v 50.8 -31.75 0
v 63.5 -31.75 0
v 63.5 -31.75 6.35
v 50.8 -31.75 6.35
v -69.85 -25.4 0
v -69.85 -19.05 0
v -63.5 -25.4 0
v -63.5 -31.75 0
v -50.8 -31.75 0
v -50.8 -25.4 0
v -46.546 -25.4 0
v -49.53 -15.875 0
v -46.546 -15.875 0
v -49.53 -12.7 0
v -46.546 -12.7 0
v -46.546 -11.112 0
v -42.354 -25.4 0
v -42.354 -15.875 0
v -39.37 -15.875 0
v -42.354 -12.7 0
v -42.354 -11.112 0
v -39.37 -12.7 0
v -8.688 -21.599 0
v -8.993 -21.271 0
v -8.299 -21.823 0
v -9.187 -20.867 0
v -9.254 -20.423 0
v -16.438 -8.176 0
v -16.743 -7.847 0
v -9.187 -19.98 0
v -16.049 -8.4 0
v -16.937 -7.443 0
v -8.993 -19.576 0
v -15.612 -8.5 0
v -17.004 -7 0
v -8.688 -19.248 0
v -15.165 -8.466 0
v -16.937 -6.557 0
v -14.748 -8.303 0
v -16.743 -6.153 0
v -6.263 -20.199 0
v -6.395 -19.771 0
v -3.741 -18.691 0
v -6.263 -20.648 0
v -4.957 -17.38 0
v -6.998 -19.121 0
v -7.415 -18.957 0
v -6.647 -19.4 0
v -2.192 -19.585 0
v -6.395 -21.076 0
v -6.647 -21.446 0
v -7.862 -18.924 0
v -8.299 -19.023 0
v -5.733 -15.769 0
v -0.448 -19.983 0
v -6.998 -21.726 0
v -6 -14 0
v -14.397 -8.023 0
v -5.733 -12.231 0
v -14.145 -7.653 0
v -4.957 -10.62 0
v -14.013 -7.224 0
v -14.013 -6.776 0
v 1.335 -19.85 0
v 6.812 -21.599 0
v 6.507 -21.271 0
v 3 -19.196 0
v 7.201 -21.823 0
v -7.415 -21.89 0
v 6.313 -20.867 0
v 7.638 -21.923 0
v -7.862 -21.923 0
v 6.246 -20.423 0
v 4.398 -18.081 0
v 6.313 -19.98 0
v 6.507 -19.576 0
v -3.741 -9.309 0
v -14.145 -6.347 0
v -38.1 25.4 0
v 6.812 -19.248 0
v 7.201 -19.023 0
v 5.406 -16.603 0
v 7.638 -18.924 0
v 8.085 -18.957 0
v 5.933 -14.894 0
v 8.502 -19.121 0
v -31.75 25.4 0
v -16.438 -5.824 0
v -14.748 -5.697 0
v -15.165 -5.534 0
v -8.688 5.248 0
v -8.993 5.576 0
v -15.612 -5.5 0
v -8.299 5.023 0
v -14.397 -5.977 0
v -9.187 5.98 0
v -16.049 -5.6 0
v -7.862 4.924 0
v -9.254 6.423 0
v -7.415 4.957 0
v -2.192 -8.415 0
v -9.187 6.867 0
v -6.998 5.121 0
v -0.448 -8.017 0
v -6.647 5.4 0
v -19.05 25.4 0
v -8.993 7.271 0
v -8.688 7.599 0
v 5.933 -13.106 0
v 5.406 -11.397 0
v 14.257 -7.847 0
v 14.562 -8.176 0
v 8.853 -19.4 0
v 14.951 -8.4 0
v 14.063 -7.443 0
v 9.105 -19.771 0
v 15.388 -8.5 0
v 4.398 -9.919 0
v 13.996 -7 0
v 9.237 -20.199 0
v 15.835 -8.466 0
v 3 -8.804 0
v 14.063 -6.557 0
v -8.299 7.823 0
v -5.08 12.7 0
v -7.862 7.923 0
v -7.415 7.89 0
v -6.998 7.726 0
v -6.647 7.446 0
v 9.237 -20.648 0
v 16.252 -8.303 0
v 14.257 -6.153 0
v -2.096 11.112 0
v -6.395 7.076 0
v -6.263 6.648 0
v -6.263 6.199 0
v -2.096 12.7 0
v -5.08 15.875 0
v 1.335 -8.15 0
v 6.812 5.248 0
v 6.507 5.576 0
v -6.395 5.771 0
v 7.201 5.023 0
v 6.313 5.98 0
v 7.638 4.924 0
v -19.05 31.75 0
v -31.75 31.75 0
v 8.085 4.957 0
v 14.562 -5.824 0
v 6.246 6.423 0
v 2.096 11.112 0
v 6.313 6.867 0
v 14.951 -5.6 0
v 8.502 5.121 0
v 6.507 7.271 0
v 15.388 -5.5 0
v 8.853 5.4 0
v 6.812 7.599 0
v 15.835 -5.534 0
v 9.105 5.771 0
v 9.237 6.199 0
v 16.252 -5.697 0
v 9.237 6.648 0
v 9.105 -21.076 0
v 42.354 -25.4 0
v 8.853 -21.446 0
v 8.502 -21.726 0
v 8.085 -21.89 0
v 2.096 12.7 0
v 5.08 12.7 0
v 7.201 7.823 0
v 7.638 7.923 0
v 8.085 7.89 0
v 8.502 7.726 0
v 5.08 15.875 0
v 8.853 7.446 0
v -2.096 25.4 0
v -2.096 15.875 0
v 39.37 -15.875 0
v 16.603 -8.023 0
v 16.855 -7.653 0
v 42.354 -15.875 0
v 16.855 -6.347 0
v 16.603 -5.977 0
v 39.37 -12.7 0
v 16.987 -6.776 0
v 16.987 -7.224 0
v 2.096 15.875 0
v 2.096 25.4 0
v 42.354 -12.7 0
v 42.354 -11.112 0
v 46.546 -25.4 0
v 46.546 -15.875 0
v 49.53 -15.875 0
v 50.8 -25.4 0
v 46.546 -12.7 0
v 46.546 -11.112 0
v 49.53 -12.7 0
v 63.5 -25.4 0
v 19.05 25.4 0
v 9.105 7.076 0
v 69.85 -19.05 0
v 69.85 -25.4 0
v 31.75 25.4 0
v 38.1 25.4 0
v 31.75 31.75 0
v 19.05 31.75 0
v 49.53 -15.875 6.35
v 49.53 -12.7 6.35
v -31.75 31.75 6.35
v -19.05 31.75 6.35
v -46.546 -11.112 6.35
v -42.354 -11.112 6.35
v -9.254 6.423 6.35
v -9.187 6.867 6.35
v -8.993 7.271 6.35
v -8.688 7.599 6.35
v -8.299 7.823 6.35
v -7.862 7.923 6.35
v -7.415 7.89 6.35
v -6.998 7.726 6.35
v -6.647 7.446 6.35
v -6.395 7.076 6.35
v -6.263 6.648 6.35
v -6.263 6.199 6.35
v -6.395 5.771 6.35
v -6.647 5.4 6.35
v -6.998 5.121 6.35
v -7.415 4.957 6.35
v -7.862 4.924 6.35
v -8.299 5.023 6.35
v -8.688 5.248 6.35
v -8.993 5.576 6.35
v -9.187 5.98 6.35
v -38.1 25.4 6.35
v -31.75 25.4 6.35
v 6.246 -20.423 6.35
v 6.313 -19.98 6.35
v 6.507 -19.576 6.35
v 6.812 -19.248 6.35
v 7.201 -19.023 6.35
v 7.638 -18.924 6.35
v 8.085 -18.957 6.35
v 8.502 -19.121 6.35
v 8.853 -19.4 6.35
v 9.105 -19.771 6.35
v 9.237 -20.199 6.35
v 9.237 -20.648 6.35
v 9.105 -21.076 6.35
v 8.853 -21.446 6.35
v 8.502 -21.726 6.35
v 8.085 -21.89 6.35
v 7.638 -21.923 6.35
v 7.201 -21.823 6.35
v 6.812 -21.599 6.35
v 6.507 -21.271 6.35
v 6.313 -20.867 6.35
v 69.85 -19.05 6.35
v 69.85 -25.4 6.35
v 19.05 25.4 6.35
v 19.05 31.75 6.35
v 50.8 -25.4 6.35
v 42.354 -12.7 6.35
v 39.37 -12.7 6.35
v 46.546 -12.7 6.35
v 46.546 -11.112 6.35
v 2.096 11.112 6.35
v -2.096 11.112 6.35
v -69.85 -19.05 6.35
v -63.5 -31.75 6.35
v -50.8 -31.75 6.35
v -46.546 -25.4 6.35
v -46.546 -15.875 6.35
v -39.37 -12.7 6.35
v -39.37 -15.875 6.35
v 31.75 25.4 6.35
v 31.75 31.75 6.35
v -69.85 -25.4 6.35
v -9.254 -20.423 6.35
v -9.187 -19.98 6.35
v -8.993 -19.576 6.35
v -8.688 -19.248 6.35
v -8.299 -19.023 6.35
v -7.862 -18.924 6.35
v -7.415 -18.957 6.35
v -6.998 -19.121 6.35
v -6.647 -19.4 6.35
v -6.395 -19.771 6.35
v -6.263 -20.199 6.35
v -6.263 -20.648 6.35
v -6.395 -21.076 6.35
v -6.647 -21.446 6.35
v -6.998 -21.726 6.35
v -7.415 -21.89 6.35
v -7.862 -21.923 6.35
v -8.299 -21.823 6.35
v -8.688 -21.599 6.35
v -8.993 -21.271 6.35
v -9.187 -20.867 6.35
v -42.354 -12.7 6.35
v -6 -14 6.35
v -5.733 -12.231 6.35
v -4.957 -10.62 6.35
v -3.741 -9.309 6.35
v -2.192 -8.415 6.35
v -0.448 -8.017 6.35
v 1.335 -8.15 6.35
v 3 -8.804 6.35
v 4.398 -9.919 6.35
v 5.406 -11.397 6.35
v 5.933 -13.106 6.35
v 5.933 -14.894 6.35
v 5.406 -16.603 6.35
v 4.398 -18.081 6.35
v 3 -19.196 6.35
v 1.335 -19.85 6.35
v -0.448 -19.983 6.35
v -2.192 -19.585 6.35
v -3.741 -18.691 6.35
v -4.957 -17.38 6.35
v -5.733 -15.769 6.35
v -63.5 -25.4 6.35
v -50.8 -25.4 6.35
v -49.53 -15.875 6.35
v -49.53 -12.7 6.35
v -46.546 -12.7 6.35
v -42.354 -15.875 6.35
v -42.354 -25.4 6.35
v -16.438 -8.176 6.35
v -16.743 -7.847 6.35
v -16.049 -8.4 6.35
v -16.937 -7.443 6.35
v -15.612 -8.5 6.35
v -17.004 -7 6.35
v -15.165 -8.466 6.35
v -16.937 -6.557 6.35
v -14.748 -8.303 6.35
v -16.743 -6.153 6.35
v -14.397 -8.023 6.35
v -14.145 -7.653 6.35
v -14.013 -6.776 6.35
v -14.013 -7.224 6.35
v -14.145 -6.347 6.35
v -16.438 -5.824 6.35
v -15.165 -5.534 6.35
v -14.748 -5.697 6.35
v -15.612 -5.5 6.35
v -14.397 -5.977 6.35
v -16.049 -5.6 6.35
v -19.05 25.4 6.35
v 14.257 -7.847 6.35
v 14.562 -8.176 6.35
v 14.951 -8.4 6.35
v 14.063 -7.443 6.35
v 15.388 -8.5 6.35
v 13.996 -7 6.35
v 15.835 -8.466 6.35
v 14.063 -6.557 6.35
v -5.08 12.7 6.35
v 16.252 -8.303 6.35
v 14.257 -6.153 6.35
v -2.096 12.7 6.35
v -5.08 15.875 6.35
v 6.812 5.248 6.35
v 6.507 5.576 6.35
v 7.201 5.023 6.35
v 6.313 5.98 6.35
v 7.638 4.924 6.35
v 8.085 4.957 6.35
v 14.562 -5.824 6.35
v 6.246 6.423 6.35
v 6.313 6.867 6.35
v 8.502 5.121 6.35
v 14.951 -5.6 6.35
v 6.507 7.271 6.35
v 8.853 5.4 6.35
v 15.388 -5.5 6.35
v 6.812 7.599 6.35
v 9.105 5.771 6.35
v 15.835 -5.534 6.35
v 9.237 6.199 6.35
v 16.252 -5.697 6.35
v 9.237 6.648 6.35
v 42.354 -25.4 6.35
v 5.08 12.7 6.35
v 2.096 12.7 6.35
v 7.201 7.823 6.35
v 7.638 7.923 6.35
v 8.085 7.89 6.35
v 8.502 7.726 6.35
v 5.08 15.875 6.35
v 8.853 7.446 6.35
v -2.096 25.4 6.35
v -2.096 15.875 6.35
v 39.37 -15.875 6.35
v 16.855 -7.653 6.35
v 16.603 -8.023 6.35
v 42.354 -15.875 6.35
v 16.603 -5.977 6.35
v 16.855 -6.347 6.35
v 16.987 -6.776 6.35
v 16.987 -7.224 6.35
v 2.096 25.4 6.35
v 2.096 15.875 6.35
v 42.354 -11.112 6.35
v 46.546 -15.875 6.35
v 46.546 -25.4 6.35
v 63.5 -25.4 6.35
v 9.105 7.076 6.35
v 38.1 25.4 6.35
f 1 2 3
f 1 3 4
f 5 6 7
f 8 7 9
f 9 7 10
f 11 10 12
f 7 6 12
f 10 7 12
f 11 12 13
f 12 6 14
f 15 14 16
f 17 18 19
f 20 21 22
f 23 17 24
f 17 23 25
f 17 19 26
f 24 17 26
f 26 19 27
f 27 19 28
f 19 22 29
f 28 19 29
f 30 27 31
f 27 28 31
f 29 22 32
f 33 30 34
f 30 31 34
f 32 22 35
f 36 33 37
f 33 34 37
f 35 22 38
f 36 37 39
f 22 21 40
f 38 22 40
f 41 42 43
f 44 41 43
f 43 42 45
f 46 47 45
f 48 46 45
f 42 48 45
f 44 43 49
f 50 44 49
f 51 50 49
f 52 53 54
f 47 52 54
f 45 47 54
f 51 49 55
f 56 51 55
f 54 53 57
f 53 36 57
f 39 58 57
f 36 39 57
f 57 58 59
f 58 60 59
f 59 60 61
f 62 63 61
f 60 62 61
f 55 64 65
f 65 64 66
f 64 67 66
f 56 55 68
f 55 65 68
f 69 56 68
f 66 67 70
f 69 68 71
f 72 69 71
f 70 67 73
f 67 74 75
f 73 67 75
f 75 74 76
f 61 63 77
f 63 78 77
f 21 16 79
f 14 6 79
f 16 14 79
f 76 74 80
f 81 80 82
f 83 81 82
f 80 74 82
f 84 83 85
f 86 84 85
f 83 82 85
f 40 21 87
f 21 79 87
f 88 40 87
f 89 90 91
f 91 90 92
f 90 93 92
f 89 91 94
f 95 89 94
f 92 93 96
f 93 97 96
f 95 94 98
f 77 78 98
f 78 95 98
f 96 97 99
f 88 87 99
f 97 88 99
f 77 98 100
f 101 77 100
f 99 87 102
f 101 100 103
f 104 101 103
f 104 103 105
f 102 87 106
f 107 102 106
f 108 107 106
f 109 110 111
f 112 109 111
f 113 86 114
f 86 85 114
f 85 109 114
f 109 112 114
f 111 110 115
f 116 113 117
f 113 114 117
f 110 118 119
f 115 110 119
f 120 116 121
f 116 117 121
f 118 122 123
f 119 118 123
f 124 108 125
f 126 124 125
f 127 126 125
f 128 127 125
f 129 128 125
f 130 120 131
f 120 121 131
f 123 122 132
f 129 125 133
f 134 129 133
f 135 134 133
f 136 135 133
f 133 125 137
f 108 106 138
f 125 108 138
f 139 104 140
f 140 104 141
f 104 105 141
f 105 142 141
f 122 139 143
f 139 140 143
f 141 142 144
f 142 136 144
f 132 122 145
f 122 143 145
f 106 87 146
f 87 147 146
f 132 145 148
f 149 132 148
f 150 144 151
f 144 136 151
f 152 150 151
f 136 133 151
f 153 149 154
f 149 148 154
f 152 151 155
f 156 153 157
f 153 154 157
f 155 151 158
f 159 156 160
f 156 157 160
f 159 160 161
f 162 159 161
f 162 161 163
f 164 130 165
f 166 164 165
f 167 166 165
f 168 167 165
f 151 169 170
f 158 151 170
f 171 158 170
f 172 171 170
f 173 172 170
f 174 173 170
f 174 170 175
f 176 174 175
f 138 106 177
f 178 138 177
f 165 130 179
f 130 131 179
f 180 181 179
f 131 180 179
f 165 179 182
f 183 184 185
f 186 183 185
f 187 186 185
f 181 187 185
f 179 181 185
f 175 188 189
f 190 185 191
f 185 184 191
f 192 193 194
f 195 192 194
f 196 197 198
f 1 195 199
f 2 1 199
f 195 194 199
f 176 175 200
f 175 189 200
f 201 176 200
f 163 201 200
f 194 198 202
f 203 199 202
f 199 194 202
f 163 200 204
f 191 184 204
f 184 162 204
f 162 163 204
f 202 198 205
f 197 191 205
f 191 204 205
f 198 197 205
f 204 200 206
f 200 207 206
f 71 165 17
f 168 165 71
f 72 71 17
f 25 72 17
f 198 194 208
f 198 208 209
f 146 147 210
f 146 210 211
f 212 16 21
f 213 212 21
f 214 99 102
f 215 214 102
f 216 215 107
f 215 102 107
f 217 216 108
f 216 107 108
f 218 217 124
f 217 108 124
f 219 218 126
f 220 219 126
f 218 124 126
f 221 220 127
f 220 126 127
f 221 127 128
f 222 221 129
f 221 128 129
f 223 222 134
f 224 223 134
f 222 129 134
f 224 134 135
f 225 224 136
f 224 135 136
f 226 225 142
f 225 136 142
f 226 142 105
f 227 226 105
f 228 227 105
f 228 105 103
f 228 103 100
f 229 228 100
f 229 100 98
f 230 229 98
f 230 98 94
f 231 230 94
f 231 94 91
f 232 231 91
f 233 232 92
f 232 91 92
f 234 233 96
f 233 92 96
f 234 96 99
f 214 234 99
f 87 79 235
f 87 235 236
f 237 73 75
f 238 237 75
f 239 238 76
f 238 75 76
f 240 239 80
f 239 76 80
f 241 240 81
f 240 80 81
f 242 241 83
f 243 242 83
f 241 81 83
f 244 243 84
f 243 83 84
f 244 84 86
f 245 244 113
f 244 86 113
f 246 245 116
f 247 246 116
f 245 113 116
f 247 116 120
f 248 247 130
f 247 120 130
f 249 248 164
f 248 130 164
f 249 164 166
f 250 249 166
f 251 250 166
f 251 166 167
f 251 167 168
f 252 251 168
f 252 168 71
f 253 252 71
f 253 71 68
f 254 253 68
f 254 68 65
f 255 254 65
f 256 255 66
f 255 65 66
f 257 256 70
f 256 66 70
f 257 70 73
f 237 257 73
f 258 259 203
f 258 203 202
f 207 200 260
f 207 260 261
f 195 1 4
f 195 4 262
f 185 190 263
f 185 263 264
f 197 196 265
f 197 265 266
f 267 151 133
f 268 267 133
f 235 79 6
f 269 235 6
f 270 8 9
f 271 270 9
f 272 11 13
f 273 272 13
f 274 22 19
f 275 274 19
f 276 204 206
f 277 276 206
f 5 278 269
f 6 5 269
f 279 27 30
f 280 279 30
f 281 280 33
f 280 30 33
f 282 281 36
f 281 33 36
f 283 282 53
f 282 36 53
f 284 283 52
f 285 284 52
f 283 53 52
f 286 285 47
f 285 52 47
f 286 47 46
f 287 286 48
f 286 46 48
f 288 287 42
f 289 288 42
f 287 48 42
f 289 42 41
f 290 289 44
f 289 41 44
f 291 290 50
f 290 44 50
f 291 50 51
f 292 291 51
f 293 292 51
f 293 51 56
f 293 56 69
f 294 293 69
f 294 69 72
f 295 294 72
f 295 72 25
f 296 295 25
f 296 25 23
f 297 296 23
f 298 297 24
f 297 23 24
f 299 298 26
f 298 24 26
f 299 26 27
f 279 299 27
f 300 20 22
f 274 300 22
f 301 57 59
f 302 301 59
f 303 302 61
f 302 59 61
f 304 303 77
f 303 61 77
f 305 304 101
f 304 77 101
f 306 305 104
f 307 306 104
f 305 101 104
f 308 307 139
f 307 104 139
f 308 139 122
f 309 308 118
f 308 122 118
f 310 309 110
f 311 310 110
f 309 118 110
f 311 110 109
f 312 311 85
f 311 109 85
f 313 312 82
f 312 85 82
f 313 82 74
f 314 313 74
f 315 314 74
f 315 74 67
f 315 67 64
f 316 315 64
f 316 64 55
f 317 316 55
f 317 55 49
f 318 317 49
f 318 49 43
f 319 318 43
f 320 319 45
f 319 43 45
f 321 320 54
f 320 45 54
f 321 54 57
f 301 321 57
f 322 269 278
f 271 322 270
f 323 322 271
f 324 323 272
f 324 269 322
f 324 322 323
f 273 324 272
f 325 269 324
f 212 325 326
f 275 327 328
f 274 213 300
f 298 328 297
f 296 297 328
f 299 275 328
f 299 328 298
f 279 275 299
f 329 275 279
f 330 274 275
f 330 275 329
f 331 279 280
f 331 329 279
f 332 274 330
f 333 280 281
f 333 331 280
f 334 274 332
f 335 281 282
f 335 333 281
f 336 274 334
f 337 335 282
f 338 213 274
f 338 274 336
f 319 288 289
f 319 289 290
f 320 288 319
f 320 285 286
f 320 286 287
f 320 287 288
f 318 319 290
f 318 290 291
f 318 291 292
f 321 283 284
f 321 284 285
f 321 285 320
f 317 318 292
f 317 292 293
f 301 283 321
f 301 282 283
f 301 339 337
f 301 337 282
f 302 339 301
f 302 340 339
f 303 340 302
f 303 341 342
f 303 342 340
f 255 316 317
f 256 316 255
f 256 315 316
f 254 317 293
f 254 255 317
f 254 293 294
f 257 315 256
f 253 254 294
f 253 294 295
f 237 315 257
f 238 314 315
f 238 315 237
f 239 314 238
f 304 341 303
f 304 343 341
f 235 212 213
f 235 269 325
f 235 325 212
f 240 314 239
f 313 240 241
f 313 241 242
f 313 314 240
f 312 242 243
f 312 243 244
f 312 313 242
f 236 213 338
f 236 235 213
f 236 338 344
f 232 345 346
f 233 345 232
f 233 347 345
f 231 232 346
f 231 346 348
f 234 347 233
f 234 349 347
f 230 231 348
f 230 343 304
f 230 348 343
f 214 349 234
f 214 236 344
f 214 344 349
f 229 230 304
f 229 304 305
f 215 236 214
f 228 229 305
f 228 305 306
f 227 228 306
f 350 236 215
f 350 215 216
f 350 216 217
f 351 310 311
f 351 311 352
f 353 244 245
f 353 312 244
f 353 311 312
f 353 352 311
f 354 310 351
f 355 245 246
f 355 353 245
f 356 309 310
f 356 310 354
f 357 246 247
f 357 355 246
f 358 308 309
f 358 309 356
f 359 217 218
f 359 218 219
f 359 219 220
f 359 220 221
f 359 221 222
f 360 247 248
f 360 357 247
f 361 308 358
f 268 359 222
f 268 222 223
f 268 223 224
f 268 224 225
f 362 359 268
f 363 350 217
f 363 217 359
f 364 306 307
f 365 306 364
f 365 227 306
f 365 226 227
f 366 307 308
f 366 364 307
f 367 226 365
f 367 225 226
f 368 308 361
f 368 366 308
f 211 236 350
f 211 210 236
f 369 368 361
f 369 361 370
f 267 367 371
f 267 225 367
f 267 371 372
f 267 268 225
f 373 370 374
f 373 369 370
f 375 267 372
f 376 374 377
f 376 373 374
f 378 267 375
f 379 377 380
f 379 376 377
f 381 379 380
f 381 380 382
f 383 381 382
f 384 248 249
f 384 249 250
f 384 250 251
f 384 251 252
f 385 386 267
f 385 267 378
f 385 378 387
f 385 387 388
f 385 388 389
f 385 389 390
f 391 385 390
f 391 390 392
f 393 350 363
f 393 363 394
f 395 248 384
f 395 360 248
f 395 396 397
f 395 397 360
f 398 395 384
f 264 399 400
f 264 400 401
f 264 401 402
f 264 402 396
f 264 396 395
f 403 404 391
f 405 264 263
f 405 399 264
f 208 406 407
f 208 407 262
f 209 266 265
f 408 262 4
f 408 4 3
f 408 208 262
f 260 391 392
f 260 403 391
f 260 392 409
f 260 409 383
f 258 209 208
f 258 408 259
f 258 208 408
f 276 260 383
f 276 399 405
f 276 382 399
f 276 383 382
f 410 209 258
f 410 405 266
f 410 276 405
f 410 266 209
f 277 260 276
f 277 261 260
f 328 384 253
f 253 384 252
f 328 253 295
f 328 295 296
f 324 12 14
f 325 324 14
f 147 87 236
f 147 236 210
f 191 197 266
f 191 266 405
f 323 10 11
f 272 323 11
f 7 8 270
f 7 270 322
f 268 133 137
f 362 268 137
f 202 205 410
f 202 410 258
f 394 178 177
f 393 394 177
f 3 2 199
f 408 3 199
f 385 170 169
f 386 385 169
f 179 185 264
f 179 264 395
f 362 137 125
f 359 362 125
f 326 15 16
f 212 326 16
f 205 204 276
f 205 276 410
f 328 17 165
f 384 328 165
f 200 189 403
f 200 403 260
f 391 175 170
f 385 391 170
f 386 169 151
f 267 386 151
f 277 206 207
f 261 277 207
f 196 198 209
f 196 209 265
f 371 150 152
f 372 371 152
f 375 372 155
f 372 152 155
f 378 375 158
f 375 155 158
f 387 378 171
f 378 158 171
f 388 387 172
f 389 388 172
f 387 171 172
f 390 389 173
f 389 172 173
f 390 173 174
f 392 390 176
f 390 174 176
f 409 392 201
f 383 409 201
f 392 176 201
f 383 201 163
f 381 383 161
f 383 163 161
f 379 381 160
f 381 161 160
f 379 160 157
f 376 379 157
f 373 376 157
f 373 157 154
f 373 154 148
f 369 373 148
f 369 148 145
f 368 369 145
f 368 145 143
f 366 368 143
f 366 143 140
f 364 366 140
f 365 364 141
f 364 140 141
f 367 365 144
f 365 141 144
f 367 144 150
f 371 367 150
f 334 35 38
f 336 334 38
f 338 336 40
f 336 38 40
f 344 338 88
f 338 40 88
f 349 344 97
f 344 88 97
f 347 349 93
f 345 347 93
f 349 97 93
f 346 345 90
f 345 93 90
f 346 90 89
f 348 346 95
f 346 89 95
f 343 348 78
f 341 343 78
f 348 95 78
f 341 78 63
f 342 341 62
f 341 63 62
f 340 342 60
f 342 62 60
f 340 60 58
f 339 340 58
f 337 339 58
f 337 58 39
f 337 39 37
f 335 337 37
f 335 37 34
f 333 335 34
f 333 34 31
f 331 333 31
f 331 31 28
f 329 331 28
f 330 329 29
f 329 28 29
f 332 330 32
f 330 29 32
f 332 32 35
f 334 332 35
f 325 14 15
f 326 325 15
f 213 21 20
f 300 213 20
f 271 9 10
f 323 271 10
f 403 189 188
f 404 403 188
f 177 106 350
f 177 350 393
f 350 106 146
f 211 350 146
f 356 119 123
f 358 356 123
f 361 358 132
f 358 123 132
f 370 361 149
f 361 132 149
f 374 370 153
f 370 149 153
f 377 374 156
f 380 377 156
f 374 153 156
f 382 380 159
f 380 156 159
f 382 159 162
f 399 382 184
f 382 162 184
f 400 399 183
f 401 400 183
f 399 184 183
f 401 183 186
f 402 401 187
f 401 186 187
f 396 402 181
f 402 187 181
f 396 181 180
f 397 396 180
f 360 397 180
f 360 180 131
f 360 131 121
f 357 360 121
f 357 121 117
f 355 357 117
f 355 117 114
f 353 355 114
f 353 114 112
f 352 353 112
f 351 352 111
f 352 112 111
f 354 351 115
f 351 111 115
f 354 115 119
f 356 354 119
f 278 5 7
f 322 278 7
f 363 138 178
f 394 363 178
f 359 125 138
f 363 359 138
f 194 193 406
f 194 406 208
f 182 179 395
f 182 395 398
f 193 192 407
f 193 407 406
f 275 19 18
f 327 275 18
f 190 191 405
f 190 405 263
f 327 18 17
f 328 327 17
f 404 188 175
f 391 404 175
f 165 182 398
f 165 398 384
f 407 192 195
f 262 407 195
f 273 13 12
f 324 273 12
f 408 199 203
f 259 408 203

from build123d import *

# Parameters (mm, degrees)
SKETCH1_W           = 139.7
SKETCH1_H           = 50.8
BOSS_EXTRUDE1_DEPTH = 6.35
SKETCH2_W           = 12.7
SKETCH2_H           = 6.35
BOSS_EXTRUDE2_DEPTH = 6.35
CUT_EXTRUDE1_DEPTH  = 6.35
CUT_EXTRUDE8_DEPTH  = 6.35
CUT_EXTRUDE2_DEPTH  = 6.35
SKETCH5_R           = 1.504
CUT_EXTRUDE6_DEPTH  = 6.35
SKETCH6_R           = 6
CUT_EXTRUDE7_DEPTH  = 6.35


with BuildPart() as part:
    # Sketch1 → Boss-Extrude1 (new body)
    with BuildSketch(Plane.XY):
        Rectangle(SKETCH1_W, SKETCH1_H)
    extrude(amount=BOSS_EXTRUDE1_DEPTH)

    # Sketch2 → Boss-Extrude2 (add)
    with BuildSketch(Plane(origin=(0, 0, 0), x_dir=(-1, 0, 0), z_dir=(0, 0, -1))):
        with Locations((-57.15, -28.575)):
            Rectangle(SKETCH2_W, SKETCH2_H)
        with Locations((-25.4, 28.575)):
            Rectangle(SKETCH2_W, SKETCH2_H)
    boss_extrude2 = extrude(amount=-BOSS_EXTRUDE2_DEPTH)

    # Sketch3 → Cut-Extrude1 (cut)
    with BuildSketch(Plane(origin=(0, 0, 0), x_dir=(-1, 0, 0), z_dir=(0, 0, -1))):
        Polygon((-46.5455, -25.4), (-46.5455, -15.875), (-49.53, -15.875), (-49.53, -12.7), (-46.5455, -12.7), (-46.5455, -11.1125), (-42.3545, -11.1125), (-42.3545, -12.7), (-39.37, -12.7), (-39.37, -15.875), (-42.3545, -15.875), (-42.3545, -25.4), align=None)
    cut_extrude1 = extrude(amount=-CUT_EXTRUDE1_DEPTH, mode=Mode.SUBTRACT)

    # Sketch7 → Cut-Extrude8 (cut)
    with BuildSketch(Plane(origin=(0, 0, 0), x_dir=(-1, 0, 0), z_dir=(0, 0, -1))):
        Polygon((-38.1, 25.4), (-69.85, -19.05), (-69.85, 25.4), align=None)
    cut_extrude8 = extrude(amount=-CUT_EXTRUDE8_DEPTH, mode=Mode.SUBTRACT)

    # Mirror2: Boss-Extrude2, Cut-Extrude8 across plane
    add(boss_extrude2.mirror(Plane(origin=(0, 0, 0), x_dir=(0, 0, 1), z_dir=(1, 0, 0))))
    add(cut_extrude8.mirror(Plane(origin=(0, 0, 0), x_dir=(0, 0, 1), z_dir=(1, 0, 0))), mode=Mode.SUBTRACT)

    # Mirror4: Cut-Extrude1 across plane
    add(cut_extrude1.mirror(Plane(origin=(0, 0, 0), x_dir=(0, 0, 1), z_dir=(1, 0, 0))), mode=Mode.SUBTRACT)

    # Sketch4 → Cut-Extrude2 (cut)
    with BuildSketch(Plane(origin=(0, 0, 0), x_dir=(-1, 0, 0), z_dir=(0, 0, -1))):
        Polygon((2.0955, 25.4), (-2.0955, 25.4), (-2.0955, 15.875), (-5.08, 15.875), (-5.08, 12.7), (-2.0955, 12.7), (-2.0955, 11.1125), (2.0955, 11.1125), (2.0955, 12.7), (5.08, 12.7), (5.08, 15.875), (2.0955, 15.875), align=None)
    extrude(amount=-CUT_EXTRUDE2_DEPTH, mode=Mode.SUBTRACT)

    # Sketch5 → Cut-Extrude6 (cut)
    with BuildSketch(Plane(origin=(0, 0, 0), x_dir=(-1, 0, 0), z_dir=(0, 0, -1))):
        with Locations((-7.75, 6.423393759)):
            Circle(SKETCH5_R)
        with Locations((-15.5, -7)):
            Circle(SKETCH5_R)
        with Locations((-7.75, -20.423393759)):
            Circle(SKETCH5_R)
        with Locations((7.75, -20.423393759)):
            Circle(SKETCH5_R)
        with Locations((15.5, -7)):
            Circle(SKETCH5_R)
        with Locations((7.75, 6.423393759)):
            Circle(SKETCH5_R)
    extrude(amount=-CUT_EXTRUDE6_DEPTH, mode=Mode.SUBTRACT)

    # Sketch6 → Cut-Extrude7 (cut)
    with BuildSketch(Plane(origin=(0, 0, 0), x_dir=(-1, 0, 0), z_dir=(0, 0, -1))):
        with Locations((0, -14)):
            Circle(SKETCH6_R)
    extrude(amount=-CUT_EXTRUDE7_DEPTH, mode=Mode.SUBTRACT)


solid = part.part
